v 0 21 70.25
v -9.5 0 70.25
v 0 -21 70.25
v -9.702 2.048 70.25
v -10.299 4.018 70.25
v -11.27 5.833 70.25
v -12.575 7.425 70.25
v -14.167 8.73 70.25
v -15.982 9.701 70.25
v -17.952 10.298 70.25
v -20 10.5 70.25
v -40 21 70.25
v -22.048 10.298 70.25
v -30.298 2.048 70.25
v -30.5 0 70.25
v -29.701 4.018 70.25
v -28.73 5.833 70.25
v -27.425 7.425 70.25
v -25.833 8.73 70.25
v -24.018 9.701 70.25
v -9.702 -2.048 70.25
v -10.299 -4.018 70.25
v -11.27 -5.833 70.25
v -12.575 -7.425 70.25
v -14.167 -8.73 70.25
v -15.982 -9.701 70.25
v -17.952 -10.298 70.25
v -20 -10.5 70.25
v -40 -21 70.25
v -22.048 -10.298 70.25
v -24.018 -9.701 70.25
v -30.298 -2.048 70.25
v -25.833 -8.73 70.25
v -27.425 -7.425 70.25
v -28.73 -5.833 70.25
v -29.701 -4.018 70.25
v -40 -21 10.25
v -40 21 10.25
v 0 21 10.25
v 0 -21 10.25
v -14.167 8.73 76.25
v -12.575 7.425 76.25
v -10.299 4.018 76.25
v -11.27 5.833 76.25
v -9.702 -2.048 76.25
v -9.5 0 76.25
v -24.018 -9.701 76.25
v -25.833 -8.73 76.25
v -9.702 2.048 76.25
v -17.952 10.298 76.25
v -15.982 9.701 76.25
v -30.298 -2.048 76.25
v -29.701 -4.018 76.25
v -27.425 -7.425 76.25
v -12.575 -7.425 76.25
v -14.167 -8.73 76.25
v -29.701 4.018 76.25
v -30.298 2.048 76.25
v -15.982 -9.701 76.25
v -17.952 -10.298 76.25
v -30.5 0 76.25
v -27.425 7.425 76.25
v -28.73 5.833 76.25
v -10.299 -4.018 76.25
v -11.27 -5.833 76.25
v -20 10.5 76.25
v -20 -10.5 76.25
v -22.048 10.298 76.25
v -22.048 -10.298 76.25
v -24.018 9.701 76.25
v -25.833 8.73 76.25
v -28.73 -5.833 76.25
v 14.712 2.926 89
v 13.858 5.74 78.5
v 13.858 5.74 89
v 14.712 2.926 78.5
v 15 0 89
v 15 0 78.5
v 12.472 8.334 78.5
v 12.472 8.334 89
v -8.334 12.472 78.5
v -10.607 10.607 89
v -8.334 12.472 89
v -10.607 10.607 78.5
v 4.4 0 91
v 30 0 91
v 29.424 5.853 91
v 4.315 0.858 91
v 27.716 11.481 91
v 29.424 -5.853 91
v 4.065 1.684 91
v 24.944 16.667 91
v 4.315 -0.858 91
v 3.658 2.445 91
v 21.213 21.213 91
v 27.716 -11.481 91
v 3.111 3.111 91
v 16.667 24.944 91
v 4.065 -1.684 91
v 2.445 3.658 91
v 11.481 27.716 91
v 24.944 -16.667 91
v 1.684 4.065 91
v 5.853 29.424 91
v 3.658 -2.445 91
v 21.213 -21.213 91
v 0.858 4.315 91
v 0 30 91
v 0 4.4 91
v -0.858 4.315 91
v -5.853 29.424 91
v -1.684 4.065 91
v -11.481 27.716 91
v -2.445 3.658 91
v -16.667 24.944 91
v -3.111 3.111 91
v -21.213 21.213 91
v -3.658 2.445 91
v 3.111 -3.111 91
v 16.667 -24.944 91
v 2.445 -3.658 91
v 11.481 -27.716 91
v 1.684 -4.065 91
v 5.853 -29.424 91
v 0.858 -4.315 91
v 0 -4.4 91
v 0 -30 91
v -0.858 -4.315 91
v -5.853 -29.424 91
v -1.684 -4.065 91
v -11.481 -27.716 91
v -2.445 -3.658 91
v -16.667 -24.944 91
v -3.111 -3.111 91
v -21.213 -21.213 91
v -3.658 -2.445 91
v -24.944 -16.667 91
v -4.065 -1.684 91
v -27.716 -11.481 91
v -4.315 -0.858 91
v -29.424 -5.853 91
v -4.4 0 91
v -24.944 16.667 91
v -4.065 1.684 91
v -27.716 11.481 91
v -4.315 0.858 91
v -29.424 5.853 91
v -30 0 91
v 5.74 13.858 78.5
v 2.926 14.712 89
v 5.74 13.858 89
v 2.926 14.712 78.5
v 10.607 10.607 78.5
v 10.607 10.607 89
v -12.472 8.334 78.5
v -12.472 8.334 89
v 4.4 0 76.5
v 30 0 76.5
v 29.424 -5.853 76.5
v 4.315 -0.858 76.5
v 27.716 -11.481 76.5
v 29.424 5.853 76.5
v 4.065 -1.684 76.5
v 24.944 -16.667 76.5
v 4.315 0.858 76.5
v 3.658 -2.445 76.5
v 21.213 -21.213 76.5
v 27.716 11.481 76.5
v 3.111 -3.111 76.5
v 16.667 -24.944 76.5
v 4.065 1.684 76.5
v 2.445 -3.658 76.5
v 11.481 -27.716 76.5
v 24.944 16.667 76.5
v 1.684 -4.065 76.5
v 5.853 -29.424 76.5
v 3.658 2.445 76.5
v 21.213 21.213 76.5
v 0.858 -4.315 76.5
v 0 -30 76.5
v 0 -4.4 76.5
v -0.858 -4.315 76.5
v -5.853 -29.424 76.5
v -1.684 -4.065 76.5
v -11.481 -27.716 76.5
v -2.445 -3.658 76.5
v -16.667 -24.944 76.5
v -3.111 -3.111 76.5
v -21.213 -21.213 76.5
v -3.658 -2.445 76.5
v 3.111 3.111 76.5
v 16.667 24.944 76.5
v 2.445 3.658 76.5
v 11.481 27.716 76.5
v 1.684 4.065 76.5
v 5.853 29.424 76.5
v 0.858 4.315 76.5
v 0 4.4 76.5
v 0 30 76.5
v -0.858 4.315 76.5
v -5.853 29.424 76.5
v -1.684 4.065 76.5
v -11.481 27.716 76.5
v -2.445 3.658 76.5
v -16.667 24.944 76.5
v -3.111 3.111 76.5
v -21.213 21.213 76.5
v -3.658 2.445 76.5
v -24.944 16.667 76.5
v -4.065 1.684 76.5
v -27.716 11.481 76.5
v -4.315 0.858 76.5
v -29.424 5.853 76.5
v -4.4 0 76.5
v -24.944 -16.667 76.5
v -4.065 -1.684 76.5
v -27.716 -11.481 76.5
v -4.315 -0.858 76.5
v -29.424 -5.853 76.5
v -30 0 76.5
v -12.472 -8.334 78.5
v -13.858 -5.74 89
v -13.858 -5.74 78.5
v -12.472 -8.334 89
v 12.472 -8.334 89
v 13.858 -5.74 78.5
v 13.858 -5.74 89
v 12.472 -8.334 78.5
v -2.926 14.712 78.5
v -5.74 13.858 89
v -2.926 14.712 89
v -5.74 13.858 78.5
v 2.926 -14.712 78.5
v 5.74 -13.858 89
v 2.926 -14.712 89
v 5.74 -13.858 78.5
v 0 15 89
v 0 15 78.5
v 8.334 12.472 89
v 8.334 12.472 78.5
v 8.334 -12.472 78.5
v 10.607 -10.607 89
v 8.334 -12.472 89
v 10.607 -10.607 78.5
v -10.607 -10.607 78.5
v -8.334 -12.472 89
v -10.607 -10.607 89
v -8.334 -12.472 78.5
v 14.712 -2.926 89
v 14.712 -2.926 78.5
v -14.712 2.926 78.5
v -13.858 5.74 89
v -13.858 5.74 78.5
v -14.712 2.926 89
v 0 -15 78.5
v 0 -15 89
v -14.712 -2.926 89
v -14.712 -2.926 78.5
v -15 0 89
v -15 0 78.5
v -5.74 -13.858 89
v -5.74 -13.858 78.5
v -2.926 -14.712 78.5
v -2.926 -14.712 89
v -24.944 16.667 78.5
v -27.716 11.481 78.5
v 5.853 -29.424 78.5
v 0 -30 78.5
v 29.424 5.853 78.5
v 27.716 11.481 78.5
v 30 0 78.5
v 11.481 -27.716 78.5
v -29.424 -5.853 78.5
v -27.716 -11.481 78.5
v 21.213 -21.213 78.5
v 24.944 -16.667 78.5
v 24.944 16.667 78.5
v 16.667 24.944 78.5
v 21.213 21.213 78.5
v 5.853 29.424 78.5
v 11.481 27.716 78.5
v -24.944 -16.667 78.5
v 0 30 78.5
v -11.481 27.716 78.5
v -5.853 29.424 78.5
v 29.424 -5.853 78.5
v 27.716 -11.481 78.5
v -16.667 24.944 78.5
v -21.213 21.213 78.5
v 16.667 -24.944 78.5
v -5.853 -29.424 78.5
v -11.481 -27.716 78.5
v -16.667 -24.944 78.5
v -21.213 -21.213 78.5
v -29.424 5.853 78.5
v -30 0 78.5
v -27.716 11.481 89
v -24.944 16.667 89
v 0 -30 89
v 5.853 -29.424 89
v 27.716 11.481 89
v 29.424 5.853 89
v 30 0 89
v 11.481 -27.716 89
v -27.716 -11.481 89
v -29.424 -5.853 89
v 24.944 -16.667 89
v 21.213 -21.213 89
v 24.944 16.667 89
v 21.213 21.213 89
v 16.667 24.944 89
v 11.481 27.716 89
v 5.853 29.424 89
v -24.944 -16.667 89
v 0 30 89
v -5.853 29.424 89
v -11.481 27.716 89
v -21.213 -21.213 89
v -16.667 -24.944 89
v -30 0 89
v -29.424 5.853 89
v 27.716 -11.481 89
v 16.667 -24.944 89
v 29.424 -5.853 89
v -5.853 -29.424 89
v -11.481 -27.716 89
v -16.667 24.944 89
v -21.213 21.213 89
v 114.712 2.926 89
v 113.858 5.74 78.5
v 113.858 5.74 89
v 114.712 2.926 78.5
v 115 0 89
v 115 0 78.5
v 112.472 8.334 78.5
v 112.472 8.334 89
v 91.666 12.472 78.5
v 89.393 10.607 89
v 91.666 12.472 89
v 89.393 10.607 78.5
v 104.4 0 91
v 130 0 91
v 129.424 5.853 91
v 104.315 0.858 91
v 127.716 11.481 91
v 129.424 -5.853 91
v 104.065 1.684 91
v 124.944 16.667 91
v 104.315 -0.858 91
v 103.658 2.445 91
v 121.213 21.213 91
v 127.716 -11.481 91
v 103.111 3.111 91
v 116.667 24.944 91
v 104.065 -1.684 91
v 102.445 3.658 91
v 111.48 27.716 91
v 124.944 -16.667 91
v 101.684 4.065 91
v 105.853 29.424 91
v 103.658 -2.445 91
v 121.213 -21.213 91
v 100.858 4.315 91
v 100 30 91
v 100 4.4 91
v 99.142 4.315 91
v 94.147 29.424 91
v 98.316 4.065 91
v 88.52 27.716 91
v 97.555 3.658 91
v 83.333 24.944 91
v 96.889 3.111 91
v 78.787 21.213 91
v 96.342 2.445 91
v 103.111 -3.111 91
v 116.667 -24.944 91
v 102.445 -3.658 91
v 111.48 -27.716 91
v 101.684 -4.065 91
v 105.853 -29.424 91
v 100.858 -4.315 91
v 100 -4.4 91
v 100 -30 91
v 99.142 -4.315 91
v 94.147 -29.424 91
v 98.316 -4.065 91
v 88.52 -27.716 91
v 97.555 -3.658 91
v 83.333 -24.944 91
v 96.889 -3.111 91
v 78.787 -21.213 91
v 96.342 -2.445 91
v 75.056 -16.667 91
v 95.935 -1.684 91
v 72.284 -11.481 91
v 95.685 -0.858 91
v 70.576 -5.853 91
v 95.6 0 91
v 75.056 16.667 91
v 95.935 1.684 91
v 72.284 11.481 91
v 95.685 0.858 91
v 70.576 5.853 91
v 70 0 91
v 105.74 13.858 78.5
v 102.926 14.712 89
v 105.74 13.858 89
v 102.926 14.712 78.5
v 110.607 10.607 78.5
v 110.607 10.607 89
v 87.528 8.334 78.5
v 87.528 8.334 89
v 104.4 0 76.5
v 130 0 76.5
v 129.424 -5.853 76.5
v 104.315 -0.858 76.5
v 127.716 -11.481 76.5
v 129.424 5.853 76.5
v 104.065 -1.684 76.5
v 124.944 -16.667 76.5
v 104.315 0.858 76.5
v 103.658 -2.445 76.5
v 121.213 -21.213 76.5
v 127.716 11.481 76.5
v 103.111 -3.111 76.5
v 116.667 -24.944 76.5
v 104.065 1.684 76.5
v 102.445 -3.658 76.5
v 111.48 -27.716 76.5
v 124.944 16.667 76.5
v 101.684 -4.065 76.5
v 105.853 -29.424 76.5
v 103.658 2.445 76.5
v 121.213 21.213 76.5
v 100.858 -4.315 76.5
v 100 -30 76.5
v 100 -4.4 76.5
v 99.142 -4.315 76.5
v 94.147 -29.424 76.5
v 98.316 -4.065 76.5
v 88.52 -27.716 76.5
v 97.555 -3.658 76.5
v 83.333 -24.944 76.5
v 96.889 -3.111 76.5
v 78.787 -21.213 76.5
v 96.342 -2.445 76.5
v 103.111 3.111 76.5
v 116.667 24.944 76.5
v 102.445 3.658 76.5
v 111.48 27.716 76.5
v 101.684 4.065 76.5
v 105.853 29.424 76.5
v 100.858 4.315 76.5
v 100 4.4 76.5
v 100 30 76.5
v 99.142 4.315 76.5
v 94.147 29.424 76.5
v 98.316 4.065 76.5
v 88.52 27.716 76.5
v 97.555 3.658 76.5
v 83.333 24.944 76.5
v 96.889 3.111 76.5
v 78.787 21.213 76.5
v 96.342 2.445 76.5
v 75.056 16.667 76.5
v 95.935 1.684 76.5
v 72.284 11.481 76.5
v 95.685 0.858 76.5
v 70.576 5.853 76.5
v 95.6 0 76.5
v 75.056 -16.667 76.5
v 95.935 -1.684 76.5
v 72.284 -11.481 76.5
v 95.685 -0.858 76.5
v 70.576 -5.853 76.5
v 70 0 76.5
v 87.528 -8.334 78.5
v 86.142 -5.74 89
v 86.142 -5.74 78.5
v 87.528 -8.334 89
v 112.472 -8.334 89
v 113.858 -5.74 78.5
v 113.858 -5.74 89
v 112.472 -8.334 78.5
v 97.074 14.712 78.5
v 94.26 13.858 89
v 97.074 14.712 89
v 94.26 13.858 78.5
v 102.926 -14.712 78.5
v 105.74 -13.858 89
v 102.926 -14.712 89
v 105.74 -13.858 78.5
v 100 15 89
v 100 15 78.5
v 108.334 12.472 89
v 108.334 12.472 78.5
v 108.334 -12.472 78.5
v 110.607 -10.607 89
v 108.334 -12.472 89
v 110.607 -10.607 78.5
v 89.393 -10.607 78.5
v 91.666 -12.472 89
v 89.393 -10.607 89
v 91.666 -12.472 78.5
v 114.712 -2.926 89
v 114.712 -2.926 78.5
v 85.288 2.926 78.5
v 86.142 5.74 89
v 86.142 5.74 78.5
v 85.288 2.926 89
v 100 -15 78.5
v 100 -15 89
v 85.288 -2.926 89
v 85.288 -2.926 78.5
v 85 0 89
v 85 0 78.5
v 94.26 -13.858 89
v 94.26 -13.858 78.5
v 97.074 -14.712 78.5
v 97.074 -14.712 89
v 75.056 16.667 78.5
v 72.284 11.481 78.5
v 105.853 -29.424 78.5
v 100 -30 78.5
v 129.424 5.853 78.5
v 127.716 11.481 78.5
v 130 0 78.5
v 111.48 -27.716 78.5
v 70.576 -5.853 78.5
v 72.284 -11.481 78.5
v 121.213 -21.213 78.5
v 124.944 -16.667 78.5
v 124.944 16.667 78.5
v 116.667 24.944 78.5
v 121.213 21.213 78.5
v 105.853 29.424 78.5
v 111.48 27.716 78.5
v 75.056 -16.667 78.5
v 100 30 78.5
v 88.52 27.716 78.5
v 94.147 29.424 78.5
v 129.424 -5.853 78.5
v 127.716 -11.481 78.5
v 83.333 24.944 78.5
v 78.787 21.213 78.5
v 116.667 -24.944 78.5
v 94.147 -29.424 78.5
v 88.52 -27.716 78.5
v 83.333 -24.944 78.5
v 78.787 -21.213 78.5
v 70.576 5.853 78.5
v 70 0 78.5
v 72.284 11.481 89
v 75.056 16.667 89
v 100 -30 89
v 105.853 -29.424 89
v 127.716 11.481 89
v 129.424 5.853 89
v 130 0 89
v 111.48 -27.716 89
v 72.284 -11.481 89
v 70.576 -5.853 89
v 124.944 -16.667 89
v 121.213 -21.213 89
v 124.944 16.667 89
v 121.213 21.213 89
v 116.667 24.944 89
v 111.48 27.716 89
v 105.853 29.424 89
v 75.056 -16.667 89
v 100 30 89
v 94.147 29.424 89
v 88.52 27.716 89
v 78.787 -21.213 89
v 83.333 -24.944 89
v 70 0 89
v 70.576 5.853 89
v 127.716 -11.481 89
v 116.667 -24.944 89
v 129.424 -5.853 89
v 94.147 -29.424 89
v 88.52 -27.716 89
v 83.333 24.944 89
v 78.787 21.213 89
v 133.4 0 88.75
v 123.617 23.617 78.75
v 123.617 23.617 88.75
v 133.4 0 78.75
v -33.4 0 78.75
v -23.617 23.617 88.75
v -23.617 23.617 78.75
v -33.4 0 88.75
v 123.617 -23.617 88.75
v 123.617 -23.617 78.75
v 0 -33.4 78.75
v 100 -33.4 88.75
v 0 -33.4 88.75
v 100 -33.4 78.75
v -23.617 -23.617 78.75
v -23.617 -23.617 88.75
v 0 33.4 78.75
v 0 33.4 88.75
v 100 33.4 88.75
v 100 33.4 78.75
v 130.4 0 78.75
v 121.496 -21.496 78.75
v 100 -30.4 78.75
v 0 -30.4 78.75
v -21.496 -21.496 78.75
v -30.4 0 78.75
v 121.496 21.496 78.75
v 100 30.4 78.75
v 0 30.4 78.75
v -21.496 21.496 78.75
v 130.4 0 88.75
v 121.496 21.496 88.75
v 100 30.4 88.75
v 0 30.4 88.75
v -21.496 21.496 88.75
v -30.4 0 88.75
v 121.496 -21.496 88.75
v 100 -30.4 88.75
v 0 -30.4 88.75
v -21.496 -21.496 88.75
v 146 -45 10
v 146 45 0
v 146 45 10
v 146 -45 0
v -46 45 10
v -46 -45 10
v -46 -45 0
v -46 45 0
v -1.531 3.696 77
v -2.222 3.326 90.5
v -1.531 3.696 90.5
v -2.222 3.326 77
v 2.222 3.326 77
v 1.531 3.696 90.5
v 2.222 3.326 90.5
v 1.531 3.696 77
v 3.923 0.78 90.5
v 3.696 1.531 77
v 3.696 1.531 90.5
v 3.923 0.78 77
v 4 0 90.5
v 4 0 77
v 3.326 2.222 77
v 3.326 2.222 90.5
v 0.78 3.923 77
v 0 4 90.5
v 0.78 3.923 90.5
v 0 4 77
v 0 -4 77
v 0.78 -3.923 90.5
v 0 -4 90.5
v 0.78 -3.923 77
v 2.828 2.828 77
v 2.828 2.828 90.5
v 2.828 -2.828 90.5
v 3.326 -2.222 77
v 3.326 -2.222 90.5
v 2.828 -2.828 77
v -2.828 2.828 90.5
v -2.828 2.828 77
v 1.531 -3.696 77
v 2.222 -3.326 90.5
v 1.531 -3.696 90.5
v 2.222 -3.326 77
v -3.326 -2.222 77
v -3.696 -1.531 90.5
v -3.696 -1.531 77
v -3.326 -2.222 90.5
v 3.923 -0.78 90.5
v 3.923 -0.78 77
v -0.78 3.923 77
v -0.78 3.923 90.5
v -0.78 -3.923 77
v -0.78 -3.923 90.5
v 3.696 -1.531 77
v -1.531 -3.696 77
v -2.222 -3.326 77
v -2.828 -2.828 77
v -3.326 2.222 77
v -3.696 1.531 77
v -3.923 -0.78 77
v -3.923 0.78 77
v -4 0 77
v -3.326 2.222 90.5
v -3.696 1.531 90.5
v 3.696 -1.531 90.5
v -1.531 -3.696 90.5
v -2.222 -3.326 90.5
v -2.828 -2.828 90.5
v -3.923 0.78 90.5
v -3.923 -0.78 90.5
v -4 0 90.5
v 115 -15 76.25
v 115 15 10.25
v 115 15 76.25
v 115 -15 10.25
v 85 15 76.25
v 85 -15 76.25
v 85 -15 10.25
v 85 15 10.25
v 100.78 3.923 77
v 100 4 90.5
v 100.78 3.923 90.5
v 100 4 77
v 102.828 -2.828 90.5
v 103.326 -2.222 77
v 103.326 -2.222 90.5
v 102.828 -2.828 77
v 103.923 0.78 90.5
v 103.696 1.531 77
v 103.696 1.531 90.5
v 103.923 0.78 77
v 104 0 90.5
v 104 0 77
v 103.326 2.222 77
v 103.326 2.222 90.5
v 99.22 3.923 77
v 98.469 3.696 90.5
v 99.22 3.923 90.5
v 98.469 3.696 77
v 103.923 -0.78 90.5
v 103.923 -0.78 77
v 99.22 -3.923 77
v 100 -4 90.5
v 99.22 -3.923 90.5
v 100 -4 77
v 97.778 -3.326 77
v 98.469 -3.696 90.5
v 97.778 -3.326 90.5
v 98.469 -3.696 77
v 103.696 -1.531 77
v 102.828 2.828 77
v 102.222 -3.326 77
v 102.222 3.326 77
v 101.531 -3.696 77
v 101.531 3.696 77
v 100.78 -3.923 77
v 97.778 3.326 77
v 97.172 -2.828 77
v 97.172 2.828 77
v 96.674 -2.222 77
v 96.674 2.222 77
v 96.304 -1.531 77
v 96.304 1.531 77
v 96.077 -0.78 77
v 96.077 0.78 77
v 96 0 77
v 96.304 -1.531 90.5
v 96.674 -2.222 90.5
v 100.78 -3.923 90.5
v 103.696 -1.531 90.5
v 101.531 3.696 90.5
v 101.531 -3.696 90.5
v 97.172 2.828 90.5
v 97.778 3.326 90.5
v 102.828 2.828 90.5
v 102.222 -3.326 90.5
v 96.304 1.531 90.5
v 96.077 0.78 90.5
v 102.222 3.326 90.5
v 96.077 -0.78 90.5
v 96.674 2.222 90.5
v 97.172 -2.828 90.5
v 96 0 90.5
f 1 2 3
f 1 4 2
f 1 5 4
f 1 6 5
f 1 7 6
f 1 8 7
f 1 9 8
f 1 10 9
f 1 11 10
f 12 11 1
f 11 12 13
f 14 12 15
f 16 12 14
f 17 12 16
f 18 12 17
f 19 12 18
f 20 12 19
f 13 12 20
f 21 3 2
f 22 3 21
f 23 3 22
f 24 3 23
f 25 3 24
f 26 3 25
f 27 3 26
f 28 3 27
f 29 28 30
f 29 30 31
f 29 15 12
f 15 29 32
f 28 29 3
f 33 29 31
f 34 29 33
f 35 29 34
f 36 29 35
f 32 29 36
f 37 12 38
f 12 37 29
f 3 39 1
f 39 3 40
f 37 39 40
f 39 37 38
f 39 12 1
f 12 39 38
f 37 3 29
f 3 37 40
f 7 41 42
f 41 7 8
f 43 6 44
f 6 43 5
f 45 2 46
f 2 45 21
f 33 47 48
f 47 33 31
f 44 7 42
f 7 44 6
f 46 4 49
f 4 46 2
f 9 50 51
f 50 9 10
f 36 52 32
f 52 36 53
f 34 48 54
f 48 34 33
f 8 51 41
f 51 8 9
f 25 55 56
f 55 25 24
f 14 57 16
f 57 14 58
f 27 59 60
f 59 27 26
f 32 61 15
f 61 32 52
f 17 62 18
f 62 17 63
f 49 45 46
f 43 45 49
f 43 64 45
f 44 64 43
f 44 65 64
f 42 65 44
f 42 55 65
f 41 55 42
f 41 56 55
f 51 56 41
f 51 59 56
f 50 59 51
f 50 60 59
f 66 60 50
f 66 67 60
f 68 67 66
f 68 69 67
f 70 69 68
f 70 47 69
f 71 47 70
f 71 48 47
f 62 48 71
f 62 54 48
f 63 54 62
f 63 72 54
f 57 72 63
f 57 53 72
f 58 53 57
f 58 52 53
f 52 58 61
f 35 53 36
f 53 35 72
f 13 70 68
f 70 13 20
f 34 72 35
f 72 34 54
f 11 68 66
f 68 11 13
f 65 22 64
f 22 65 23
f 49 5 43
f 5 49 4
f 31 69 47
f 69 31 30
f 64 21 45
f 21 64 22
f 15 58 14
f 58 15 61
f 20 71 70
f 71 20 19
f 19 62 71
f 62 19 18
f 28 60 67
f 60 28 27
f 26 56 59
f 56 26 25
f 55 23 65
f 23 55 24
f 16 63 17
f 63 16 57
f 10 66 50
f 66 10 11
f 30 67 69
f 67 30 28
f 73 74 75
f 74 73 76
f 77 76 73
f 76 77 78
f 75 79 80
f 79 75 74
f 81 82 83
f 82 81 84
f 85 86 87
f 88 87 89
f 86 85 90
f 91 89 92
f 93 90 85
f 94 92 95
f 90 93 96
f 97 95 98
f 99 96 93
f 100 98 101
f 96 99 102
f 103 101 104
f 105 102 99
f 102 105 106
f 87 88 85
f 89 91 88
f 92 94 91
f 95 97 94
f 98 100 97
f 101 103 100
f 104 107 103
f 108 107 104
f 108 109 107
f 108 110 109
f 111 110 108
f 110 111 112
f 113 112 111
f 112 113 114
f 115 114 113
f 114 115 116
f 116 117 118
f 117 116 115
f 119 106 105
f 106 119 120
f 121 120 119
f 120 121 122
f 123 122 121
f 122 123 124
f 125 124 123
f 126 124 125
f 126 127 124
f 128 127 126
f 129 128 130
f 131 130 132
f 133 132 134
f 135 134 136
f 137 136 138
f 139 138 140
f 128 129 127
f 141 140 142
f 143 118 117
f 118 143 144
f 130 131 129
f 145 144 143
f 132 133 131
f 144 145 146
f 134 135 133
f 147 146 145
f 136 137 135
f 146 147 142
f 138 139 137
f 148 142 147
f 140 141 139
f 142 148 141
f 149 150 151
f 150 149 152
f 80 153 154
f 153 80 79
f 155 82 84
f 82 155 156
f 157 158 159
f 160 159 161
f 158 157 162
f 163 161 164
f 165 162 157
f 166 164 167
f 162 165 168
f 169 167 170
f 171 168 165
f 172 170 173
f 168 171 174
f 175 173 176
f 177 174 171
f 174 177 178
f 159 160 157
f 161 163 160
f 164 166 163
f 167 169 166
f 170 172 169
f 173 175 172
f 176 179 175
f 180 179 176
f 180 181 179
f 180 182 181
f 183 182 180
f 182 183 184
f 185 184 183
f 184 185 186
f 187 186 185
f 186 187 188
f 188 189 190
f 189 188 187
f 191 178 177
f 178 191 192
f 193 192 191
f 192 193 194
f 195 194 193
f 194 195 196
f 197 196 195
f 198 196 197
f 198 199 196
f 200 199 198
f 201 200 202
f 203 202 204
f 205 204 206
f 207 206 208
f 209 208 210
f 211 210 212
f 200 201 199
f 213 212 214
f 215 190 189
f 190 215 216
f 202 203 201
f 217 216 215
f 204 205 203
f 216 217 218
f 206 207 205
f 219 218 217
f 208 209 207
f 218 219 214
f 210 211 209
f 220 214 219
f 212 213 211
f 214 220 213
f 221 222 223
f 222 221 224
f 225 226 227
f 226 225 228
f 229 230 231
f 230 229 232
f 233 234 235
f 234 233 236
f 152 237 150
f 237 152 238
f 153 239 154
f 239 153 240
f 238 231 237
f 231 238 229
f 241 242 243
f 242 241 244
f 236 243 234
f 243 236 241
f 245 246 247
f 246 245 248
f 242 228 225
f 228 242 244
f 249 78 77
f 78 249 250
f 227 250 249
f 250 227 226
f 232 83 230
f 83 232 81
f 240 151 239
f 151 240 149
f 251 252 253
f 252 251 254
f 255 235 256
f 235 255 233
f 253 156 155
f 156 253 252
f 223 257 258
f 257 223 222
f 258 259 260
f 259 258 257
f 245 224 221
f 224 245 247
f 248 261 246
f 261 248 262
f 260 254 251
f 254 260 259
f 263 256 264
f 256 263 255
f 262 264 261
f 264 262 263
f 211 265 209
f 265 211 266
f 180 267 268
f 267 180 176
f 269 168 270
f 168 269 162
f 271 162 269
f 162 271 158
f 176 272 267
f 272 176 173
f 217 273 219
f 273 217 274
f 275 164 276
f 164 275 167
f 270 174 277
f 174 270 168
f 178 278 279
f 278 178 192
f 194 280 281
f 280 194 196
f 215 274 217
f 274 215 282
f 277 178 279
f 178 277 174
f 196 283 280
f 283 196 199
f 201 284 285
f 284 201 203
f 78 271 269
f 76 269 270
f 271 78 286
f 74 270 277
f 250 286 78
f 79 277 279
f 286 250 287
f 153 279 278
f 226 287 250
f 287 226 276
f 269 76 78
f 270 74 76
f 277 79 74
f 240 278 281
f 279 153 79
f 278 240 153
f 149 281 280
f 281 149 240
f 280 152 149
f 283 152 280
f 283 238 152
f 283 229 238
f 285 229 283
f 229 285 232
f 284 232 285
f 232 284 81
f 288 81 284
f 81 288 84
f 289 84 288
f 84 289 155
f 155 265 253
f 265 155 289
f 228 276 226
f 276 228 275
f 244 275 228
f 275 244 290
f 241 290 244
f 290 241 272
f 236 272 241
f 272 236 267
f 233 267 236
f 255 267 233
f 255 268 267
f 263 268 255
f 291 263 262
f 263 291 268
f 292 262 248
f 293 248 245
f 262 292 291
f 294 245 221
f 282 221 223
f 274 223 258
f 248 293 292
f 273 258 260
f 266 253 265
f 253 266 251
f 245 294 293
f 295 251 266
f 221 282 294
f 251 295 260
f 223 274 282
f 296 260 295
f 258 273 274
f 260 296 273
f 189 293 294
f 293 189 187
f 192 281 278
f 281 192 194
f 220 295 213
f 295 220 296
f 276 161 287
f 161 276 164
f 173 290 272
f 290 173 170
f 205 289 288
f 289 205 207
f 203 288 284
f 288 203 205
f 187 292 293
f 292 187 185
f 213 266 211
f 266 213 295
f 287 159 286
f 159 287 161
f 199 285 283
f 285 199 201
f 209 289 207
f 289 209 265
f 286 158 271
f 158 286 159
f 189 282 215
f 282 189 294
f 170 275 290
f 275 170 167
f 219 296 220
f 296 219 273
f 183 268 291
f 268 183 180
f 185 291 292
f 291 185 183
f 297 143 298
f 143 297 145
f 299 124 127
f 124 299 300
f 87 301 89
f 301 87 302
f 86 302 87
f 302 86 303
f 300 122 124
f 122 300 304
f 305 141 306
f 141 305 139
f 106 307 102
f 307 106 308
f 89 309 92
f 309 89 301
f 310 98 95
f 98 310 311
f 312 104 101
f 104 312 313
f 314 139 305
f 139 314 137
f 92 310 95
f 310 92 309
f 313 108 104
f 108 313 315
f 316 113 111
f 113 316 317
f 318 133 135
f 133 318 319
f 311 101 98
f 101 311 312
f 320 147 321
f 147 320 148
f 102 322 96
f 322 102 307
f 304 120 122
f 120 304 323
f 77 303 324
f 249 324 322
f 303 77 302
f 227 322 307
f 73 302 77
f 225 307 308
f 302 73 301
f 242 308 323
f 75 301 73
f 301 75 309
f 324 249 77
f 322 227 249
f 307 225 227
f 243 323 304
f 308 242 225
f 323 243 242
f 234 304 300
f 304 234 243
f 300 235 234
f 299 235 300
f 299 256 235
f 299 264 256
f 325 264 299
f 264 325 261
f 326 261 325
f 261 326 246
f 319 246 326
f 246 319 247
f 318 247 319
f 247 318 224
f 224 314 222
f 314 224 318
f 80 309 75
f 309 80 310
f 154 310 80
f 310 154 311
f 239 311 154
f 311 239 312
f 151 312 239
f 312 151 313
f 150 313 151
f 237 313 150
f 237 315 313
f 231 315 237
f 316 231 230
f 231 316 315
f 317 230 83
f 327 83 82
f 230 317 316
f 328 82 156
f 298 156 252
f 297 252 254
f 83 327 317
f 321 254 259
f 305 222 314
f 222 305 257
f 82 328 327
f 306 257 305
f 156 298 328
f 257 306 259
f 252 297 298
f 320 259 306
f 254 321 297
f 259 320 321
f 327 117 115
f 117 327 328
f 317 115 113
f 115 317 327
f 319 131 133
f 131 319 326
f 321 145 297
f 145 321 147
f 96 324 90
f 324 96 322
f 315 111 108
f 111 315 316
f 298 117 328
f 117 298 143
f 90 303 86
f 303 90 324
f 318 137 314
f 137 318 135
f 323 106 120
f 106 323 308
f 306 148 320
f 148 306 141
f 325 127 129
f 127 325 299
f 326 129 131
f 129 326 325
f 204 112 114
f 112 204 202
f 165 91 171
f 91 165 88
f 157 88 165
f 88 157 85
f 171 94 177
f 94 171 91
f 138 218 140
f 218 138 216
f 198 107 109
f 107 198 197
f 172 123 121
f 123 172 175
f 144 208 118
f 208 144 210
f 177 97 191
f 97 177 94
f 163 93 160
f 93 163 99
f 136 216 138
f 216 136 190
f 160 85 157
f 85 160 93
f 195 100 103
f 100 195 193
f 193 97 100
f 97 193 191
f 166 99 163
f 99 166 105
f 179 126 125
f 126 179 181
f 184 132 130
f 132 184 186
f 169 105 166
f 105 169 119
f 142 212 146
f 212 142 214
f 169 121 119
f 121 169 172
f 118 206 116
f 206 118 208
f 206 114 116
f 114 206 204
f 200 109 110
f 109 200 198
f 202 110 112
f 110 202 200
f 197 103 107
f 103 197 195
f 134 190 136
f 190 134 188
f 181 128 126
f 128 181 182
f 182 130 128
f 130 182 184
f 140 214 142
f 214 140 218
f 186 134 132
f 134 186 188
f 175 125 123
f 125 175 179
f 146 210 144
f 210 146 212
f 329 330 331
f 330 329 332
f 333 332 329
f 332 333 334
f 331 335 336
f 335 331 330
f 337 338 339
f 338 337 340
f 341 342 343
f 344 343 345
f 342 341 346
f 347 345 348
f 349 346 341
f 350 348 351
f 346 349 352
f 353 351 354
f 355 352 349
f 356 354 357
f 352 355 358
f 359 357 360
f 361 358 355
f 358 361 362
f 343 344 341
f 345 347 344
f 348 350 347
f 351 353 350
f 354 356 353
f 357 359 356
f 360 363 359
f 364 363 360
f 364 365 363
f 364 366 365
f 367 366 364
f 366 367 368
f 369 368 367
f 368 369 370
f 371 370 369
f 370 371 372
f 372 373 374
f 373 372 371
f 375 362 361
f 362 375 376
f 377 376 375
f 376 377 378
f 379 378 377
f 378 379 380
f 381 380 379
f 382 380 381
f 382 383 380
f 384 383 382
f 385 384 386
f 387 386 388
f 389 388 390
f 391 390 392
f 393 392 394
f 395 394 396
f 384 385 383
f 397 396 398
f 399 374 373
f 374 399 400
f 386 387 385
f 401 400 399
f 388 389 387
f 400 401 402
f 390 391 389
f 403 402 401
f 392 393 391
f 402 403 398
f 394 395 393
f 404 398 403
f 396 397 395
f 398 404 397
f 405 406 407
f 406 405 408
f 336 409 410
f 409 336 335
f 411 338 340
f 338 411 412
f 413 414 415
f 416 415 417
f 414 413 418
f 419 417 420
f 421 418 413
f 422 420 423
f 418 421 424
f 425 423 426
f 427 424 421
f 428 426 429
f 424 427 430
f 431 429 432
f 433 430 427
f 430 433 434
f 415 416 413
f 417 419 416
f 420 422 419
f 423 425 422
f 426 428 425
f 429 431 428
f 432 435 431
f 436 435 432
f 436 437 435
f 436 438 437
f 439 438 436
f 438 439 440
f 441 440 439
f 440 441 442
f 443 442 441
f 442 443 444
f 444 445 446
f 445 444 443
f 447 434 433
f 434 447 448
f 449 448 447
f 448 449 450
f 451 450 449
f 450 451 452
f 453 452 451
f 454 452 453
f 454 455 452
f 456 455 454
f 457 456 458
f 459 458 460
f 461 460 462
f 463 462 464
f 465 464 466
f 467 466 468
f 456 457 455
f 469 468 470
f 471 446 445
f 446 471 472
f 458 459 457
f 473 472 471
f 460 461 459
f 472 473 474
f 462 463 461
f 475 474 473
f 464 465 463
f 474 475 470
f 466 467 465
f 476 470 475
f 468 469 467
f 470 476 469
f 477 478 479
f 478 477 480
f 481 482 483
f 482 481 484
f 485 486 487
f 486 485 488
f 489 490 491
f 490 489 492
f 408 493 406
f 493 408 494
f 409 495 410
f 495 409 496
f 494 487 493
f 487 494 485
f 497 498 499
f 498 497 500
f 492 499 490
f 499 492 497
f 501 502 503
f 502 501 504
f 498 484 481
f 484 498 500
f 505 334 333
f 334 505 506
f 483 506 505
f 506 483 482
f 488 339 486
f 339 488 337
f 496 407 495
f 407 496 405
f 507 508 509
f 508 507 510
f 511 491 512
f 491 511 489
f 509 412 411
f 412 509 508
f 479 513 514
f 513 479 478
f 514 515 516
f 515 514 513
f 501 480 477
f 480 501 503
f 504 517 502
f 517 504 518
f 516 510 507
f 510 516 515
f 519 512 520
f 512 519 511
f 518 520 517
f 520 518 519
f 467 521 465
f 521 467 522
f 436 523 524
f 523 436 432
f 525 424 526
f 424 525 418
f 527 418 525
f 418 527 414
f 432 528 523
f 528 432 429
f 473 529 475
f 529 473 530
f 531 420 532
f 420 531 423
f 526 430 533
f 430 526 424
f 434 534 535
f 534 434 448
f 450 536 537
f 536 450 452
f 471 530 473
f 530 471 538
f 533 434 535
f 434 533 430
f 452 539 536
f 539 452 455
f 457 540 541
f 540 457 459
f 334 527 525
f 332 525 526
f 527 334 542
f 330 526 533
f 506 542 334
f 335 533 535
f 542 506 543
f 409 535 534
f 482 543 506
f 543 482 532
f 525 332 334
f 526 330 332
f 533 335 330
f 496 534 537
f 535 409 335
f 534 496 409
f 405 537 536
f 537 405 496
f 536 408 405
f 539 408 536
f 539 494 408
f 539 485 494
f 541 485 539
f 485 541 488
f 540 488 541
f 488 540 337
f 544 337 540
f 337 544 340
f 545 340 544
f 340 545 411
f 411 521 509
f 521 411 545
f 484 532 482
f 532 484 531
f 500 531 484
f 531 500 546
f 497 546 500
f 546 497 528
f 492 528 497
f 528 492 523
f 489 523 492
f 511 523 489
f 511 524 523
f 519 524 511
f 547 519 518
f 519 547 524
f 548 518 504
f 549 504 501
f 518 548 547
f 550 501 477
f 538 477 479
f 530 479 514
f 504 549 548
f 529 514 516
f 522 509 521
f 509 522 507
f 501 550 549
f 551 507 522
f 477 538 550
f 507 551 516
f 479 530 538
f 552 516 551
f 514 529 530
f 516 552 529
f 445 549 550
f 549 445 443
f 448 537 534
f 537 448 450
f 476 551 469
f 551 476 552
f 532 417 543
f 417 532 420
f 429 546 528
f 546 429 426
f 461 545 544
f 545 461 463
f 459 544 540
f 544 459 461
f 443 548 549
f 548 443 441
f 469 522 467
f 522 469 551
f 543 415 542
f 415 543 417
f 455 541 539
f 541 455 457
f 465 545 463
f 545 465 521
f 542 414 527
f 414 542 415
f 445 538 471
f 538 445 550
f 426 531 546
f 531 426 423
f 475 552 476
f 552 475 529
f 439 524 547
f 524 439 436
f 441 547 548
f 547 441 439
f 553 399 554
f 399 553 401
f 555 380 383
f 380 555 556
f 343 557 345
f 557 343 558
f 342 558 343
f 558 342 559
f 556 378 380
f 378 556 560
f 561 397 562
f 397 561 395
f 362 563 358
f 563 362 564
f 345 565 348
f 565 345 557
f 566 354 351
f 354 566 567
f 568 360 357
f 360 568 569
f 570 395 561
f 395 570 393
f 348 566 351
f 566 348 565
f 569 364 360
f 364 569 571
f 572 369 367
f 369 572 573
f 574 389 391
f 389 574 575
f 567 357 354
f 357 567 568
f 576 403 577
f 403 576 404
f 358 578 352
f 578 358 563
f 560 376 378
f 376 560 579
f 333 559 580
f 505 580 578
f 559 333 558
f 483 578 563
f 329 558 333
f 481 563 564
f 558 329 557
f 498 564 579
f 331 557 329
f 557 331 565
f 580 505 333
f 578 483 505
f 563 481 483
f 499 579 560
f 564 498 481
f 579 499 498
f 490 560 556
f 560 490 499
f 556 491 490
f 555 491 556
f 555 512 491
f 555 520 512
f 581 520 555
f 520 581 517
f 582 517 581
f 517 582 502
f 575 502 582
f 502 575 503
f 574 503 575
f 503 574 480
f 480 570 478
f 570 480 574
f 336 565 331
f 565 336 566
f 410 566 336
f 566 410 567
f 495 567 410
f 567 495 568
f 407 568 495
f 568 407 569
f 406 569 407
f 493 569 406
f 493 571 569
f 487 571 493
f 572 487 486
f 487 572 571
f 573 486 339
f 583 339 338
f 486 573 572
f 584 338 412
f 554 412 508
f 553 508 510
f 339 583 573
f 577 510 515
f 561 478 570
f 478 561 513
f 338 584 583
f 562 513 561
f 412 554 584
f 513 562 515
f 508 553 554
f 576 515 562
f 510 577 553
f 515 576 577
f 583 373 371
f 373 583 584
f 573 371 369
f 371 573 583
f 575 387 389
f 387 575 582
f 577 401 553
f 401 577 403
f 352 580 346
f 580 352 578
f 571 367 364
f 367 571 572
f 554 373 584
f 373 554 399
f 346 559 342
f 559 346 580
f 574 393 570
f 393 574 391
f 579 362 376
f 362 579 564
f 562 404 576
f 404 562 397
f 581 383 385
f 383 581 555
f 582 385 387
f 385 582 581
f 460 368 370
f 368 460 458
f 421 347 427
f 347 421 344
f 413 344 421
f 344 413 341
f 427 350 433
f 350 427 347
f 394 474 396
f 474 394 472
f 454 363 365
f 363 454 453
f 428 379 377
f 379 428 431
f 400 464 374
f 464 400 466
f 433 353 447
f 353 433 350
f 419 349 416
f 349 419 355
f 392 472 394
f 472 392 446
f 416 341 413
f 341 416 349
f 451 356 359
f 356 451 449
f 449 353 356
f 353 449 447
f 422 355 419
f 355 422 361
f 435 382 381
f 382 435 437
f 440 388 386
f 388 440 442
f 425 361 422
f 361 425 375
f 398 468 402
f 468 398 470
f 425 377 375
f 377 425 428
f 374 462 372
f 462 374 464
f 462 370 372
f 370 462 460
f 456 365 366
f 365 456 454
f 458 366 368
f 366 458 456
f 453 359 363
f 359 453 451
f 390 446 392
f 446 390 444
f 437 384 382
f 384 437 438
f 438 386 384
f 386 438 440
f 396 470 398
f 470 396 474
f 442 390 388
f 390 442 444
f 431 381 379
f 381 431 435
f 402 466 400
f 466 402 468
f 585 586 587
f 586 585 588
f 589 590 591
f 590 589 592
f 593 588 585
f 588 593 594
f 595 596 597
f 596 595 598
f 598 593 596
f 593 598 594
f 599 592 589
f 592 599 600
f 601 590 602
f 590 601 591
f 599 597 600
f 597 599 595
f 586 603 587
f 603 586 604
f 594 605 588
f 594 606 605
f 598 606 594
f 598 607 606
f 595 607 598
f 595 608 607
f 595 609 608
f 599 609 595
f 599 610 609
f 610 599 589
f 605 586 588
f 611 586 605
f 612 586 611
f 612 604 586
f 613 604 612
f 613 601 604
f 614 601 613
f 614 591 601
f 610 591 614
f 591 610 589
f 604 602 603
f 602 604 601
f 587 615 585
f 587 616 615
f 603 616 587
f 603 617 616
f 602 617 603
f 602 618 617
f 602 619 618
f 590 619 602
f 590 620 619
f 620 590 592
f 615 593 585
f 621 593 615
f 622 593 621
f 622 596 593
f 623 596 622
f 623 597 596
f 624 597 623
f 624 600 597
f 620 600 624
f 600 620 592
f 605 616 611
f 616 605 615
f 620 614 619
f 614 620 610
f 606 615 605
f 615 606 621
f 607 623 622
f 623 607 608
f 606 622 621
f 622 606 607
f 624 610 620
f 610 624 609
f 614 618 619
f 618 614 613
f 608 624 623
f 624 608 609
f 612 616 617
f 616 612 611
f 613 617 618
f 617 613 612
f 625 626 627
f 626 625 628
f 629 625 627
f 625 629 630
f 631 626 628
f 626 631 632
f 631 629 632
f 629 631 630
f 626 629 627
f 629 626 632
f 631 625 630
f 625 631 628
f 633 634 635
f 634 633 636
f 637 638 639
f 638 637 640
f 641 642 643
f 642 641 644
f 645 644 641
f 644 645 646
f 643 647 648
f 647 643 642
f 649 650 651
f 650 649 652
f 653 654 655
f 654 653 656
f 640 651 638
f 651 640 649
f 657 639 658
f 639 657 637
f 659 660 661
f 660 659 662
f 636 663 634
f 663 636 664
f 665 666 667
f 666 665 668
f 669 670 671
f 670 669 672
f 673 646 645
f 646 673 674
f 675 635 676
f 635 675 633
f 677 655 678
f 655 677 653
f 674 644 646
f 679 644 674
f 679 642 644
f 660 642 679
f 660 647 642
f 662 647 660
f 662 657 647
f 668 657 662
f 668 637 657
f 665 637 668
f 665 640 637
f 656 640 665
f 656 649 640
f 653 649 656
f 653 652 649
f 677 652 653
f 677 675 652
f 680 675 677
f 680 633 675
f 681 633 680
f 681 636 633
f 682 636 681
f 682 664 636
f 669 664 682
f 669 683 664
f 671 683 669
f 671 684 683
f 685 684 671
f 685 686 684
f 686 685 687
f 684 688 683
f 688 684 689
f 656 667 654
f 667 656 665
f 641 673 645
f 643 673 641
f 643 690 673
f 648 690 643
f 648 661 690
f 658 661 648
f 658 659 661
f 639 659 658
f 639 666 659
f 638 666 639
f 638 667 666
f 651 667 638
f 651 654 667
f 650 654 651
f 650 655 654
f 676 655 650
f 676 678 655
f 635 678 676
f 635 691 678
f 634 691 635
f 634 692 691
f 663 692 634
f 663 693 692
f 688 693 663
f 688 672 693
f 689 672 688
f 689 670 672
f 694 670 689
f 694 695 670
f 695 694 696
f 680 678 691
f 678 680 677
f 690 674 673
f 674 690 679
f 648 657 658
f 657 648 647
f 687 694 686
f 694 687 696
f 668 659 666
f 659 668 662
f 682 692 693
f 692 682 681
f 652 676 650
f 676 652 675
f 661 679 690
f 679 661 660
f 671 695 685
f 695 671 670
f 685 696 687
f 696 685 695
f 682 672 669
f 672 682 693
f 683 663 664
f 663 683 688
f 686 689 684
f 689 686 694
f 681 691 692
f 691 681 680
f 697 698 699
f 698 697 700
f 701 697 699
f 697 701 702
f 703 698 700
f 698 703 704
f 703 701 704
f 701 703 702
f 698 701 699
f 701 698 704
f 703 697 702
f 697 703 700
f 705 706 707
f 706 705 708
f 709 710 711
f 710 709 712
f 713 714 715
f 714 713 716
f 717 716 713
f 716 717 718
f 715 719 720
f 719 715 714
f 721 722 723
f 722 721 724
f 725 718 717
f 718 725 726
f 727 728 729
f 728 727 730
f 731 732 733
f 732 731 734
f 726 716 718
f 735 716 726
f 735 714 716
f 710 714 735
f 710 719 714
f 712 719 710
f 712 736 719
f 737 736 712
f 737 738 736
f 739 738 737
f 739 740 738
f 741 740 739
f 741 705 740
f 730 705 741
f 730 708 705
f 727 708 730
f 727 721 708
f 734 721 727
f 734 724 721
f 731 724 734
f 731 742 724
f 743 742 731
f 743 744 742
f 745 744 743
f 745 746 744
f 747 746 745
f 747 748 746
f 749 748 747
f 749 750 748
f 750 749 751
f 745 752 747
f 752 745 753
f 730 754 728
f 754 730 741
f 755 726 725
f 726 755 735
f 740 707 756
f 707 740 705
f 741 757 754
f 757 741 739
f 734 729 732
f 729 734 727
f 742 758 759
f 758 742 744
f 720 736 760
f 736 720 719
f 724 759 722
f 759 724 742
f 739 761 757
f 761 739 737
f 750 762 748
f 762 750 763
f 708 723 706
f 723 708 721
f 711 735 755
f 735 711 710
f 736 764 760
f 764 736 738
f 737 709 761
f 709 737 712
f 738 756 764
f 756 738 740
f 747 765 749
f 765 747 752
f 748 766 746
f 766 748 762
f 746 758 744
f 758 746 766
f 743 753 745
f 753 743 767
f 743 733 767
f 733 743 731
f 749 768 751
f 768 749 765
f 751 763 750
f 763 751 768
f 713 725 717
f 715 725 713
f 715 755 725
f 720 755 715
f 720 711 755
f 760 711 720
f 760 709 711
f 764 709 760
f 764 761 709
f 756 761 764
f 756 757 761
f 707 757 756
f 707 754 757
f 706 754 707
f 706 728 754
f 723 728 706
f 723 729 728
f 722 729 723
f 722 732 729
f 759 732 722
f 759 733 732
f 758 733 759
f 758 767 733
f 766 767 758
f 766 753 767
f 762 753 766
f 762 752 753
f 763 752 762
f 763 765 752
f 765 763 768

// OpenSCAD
$fn = 32;

// ------------------------------------------------------------------------
// Motor belt drive: span 100 mm, pulleys d60, belt 10 mm wide
// Every part is its own module, assembly() places every instance.
// ------------------------------------------------------------------------

// --- part 1 ---
module base_plate() {
  difference() {
    translate([-96, -45, 0]) cube([192, 90, 10]);
  }
}

// --- part 2 ---
module motor() {
  union() {
    translate([-30, -21, 0]) cube([60, 42, 40]);
    translate([33, 0, 20]) rotate([0, 90, 0]) cylinder(h = 6, d = 21, center = true);
  }
}

// --- part 3 ---
module drive_shaft() {
  translate([0, 0, -6.75]) cylinder(h = 13.5, d = 8);
}

// --- part 4 ---
module pulley_drive() {
  difference() {
    union() {
      cylinder(h = 14.5, d = 30);
      cylinder(h = 2, d = 60);
      translate([0, 0, 12.5]) cylinder(h = 2, d = 60);
    }
    translate([0, 0, -1]) cylinder(h = 16.5, d = 8.8);
  }
}

// --- part 5 ---
module idler_post() {
  translate([-15, -15, 0]) cube([30, 30, 66]);
}

// --- part 6 ---
module driven_shaft() {
  translate([0, 0, -6.75]) cylinder(h = 13.5, d = 8);
}

// --- part 7 ---
module pulley_driven() {
  difference() {
    union() {
      cylinder(h = 14.5, d = 30);
      cylinder(h = 2, d = 60);
      translate([0, 0, 12.5]) cylinder(h = 2, d = 60);
    }
    translate([0, 0, -1]) cylinder(h = 16.5, d = 8.8);
  }
}

// --- part 8 ---
module drive_belt() {
  difference() {
    linear_extrude(height = 10) polygon(points = concat([for (a = [90 : 45 : 270]) [33.4 * cos(a), 33.4 * sin(a)]], [for (a = [270 : 45 : 450]) [100 + 33.4 * cos(a), 33.4 * sin(a)]]));
    translate([0, 0, -1]) linear_extrude(height = 12) polygon(points = concat([for (a = [90 : 45 : 270]) [30.4 * cos(a), 30.4 * sin(a)]], [for (a = [270 : 45 : 450]) [100 + 30.4 * cos(a), 30.4 * sin(a)]]));
  }
}

// --- assembly ---
module assembly() {
  color([0.80, 0.24, 0.20]) translate([50, 0, 0]) rotate([0, 0, 0]) base_plate();
  color([0.20, 0.45, 0.75]) translate([0, 0, 40.25]) rotate([0, 270, 0]) motor();
  color([0.25, 0.62, 0.32]) translate([0, 0, 83.75]) rotate([0, 0, 0]) drive_shaft();
  color([0.92, 0.70, 0.18]) translate([0, 0, 76.5]) rotate([0, 0, 0]) pulley_drive();
  color([0.58, 0.35, 0.70]) translate([100, 0, 10.25]) rotate([0, 0, 0]) idler_post();
  color([0.16, 0.66, 0.66]) translate([100, 0, 83.75]) rotate([0, 0, 0]) driven_shaft();
  color([0.85, 0.48, 0.18]) translate([100, 0, 76.5]) rotate([0, 0, 0]) pulley_driven();
  color([0.55, 0.60, 0.65]) translate([0, 0, 78.75]) rotate([0, 0, 0]) drive_belt();
}

assembly();
